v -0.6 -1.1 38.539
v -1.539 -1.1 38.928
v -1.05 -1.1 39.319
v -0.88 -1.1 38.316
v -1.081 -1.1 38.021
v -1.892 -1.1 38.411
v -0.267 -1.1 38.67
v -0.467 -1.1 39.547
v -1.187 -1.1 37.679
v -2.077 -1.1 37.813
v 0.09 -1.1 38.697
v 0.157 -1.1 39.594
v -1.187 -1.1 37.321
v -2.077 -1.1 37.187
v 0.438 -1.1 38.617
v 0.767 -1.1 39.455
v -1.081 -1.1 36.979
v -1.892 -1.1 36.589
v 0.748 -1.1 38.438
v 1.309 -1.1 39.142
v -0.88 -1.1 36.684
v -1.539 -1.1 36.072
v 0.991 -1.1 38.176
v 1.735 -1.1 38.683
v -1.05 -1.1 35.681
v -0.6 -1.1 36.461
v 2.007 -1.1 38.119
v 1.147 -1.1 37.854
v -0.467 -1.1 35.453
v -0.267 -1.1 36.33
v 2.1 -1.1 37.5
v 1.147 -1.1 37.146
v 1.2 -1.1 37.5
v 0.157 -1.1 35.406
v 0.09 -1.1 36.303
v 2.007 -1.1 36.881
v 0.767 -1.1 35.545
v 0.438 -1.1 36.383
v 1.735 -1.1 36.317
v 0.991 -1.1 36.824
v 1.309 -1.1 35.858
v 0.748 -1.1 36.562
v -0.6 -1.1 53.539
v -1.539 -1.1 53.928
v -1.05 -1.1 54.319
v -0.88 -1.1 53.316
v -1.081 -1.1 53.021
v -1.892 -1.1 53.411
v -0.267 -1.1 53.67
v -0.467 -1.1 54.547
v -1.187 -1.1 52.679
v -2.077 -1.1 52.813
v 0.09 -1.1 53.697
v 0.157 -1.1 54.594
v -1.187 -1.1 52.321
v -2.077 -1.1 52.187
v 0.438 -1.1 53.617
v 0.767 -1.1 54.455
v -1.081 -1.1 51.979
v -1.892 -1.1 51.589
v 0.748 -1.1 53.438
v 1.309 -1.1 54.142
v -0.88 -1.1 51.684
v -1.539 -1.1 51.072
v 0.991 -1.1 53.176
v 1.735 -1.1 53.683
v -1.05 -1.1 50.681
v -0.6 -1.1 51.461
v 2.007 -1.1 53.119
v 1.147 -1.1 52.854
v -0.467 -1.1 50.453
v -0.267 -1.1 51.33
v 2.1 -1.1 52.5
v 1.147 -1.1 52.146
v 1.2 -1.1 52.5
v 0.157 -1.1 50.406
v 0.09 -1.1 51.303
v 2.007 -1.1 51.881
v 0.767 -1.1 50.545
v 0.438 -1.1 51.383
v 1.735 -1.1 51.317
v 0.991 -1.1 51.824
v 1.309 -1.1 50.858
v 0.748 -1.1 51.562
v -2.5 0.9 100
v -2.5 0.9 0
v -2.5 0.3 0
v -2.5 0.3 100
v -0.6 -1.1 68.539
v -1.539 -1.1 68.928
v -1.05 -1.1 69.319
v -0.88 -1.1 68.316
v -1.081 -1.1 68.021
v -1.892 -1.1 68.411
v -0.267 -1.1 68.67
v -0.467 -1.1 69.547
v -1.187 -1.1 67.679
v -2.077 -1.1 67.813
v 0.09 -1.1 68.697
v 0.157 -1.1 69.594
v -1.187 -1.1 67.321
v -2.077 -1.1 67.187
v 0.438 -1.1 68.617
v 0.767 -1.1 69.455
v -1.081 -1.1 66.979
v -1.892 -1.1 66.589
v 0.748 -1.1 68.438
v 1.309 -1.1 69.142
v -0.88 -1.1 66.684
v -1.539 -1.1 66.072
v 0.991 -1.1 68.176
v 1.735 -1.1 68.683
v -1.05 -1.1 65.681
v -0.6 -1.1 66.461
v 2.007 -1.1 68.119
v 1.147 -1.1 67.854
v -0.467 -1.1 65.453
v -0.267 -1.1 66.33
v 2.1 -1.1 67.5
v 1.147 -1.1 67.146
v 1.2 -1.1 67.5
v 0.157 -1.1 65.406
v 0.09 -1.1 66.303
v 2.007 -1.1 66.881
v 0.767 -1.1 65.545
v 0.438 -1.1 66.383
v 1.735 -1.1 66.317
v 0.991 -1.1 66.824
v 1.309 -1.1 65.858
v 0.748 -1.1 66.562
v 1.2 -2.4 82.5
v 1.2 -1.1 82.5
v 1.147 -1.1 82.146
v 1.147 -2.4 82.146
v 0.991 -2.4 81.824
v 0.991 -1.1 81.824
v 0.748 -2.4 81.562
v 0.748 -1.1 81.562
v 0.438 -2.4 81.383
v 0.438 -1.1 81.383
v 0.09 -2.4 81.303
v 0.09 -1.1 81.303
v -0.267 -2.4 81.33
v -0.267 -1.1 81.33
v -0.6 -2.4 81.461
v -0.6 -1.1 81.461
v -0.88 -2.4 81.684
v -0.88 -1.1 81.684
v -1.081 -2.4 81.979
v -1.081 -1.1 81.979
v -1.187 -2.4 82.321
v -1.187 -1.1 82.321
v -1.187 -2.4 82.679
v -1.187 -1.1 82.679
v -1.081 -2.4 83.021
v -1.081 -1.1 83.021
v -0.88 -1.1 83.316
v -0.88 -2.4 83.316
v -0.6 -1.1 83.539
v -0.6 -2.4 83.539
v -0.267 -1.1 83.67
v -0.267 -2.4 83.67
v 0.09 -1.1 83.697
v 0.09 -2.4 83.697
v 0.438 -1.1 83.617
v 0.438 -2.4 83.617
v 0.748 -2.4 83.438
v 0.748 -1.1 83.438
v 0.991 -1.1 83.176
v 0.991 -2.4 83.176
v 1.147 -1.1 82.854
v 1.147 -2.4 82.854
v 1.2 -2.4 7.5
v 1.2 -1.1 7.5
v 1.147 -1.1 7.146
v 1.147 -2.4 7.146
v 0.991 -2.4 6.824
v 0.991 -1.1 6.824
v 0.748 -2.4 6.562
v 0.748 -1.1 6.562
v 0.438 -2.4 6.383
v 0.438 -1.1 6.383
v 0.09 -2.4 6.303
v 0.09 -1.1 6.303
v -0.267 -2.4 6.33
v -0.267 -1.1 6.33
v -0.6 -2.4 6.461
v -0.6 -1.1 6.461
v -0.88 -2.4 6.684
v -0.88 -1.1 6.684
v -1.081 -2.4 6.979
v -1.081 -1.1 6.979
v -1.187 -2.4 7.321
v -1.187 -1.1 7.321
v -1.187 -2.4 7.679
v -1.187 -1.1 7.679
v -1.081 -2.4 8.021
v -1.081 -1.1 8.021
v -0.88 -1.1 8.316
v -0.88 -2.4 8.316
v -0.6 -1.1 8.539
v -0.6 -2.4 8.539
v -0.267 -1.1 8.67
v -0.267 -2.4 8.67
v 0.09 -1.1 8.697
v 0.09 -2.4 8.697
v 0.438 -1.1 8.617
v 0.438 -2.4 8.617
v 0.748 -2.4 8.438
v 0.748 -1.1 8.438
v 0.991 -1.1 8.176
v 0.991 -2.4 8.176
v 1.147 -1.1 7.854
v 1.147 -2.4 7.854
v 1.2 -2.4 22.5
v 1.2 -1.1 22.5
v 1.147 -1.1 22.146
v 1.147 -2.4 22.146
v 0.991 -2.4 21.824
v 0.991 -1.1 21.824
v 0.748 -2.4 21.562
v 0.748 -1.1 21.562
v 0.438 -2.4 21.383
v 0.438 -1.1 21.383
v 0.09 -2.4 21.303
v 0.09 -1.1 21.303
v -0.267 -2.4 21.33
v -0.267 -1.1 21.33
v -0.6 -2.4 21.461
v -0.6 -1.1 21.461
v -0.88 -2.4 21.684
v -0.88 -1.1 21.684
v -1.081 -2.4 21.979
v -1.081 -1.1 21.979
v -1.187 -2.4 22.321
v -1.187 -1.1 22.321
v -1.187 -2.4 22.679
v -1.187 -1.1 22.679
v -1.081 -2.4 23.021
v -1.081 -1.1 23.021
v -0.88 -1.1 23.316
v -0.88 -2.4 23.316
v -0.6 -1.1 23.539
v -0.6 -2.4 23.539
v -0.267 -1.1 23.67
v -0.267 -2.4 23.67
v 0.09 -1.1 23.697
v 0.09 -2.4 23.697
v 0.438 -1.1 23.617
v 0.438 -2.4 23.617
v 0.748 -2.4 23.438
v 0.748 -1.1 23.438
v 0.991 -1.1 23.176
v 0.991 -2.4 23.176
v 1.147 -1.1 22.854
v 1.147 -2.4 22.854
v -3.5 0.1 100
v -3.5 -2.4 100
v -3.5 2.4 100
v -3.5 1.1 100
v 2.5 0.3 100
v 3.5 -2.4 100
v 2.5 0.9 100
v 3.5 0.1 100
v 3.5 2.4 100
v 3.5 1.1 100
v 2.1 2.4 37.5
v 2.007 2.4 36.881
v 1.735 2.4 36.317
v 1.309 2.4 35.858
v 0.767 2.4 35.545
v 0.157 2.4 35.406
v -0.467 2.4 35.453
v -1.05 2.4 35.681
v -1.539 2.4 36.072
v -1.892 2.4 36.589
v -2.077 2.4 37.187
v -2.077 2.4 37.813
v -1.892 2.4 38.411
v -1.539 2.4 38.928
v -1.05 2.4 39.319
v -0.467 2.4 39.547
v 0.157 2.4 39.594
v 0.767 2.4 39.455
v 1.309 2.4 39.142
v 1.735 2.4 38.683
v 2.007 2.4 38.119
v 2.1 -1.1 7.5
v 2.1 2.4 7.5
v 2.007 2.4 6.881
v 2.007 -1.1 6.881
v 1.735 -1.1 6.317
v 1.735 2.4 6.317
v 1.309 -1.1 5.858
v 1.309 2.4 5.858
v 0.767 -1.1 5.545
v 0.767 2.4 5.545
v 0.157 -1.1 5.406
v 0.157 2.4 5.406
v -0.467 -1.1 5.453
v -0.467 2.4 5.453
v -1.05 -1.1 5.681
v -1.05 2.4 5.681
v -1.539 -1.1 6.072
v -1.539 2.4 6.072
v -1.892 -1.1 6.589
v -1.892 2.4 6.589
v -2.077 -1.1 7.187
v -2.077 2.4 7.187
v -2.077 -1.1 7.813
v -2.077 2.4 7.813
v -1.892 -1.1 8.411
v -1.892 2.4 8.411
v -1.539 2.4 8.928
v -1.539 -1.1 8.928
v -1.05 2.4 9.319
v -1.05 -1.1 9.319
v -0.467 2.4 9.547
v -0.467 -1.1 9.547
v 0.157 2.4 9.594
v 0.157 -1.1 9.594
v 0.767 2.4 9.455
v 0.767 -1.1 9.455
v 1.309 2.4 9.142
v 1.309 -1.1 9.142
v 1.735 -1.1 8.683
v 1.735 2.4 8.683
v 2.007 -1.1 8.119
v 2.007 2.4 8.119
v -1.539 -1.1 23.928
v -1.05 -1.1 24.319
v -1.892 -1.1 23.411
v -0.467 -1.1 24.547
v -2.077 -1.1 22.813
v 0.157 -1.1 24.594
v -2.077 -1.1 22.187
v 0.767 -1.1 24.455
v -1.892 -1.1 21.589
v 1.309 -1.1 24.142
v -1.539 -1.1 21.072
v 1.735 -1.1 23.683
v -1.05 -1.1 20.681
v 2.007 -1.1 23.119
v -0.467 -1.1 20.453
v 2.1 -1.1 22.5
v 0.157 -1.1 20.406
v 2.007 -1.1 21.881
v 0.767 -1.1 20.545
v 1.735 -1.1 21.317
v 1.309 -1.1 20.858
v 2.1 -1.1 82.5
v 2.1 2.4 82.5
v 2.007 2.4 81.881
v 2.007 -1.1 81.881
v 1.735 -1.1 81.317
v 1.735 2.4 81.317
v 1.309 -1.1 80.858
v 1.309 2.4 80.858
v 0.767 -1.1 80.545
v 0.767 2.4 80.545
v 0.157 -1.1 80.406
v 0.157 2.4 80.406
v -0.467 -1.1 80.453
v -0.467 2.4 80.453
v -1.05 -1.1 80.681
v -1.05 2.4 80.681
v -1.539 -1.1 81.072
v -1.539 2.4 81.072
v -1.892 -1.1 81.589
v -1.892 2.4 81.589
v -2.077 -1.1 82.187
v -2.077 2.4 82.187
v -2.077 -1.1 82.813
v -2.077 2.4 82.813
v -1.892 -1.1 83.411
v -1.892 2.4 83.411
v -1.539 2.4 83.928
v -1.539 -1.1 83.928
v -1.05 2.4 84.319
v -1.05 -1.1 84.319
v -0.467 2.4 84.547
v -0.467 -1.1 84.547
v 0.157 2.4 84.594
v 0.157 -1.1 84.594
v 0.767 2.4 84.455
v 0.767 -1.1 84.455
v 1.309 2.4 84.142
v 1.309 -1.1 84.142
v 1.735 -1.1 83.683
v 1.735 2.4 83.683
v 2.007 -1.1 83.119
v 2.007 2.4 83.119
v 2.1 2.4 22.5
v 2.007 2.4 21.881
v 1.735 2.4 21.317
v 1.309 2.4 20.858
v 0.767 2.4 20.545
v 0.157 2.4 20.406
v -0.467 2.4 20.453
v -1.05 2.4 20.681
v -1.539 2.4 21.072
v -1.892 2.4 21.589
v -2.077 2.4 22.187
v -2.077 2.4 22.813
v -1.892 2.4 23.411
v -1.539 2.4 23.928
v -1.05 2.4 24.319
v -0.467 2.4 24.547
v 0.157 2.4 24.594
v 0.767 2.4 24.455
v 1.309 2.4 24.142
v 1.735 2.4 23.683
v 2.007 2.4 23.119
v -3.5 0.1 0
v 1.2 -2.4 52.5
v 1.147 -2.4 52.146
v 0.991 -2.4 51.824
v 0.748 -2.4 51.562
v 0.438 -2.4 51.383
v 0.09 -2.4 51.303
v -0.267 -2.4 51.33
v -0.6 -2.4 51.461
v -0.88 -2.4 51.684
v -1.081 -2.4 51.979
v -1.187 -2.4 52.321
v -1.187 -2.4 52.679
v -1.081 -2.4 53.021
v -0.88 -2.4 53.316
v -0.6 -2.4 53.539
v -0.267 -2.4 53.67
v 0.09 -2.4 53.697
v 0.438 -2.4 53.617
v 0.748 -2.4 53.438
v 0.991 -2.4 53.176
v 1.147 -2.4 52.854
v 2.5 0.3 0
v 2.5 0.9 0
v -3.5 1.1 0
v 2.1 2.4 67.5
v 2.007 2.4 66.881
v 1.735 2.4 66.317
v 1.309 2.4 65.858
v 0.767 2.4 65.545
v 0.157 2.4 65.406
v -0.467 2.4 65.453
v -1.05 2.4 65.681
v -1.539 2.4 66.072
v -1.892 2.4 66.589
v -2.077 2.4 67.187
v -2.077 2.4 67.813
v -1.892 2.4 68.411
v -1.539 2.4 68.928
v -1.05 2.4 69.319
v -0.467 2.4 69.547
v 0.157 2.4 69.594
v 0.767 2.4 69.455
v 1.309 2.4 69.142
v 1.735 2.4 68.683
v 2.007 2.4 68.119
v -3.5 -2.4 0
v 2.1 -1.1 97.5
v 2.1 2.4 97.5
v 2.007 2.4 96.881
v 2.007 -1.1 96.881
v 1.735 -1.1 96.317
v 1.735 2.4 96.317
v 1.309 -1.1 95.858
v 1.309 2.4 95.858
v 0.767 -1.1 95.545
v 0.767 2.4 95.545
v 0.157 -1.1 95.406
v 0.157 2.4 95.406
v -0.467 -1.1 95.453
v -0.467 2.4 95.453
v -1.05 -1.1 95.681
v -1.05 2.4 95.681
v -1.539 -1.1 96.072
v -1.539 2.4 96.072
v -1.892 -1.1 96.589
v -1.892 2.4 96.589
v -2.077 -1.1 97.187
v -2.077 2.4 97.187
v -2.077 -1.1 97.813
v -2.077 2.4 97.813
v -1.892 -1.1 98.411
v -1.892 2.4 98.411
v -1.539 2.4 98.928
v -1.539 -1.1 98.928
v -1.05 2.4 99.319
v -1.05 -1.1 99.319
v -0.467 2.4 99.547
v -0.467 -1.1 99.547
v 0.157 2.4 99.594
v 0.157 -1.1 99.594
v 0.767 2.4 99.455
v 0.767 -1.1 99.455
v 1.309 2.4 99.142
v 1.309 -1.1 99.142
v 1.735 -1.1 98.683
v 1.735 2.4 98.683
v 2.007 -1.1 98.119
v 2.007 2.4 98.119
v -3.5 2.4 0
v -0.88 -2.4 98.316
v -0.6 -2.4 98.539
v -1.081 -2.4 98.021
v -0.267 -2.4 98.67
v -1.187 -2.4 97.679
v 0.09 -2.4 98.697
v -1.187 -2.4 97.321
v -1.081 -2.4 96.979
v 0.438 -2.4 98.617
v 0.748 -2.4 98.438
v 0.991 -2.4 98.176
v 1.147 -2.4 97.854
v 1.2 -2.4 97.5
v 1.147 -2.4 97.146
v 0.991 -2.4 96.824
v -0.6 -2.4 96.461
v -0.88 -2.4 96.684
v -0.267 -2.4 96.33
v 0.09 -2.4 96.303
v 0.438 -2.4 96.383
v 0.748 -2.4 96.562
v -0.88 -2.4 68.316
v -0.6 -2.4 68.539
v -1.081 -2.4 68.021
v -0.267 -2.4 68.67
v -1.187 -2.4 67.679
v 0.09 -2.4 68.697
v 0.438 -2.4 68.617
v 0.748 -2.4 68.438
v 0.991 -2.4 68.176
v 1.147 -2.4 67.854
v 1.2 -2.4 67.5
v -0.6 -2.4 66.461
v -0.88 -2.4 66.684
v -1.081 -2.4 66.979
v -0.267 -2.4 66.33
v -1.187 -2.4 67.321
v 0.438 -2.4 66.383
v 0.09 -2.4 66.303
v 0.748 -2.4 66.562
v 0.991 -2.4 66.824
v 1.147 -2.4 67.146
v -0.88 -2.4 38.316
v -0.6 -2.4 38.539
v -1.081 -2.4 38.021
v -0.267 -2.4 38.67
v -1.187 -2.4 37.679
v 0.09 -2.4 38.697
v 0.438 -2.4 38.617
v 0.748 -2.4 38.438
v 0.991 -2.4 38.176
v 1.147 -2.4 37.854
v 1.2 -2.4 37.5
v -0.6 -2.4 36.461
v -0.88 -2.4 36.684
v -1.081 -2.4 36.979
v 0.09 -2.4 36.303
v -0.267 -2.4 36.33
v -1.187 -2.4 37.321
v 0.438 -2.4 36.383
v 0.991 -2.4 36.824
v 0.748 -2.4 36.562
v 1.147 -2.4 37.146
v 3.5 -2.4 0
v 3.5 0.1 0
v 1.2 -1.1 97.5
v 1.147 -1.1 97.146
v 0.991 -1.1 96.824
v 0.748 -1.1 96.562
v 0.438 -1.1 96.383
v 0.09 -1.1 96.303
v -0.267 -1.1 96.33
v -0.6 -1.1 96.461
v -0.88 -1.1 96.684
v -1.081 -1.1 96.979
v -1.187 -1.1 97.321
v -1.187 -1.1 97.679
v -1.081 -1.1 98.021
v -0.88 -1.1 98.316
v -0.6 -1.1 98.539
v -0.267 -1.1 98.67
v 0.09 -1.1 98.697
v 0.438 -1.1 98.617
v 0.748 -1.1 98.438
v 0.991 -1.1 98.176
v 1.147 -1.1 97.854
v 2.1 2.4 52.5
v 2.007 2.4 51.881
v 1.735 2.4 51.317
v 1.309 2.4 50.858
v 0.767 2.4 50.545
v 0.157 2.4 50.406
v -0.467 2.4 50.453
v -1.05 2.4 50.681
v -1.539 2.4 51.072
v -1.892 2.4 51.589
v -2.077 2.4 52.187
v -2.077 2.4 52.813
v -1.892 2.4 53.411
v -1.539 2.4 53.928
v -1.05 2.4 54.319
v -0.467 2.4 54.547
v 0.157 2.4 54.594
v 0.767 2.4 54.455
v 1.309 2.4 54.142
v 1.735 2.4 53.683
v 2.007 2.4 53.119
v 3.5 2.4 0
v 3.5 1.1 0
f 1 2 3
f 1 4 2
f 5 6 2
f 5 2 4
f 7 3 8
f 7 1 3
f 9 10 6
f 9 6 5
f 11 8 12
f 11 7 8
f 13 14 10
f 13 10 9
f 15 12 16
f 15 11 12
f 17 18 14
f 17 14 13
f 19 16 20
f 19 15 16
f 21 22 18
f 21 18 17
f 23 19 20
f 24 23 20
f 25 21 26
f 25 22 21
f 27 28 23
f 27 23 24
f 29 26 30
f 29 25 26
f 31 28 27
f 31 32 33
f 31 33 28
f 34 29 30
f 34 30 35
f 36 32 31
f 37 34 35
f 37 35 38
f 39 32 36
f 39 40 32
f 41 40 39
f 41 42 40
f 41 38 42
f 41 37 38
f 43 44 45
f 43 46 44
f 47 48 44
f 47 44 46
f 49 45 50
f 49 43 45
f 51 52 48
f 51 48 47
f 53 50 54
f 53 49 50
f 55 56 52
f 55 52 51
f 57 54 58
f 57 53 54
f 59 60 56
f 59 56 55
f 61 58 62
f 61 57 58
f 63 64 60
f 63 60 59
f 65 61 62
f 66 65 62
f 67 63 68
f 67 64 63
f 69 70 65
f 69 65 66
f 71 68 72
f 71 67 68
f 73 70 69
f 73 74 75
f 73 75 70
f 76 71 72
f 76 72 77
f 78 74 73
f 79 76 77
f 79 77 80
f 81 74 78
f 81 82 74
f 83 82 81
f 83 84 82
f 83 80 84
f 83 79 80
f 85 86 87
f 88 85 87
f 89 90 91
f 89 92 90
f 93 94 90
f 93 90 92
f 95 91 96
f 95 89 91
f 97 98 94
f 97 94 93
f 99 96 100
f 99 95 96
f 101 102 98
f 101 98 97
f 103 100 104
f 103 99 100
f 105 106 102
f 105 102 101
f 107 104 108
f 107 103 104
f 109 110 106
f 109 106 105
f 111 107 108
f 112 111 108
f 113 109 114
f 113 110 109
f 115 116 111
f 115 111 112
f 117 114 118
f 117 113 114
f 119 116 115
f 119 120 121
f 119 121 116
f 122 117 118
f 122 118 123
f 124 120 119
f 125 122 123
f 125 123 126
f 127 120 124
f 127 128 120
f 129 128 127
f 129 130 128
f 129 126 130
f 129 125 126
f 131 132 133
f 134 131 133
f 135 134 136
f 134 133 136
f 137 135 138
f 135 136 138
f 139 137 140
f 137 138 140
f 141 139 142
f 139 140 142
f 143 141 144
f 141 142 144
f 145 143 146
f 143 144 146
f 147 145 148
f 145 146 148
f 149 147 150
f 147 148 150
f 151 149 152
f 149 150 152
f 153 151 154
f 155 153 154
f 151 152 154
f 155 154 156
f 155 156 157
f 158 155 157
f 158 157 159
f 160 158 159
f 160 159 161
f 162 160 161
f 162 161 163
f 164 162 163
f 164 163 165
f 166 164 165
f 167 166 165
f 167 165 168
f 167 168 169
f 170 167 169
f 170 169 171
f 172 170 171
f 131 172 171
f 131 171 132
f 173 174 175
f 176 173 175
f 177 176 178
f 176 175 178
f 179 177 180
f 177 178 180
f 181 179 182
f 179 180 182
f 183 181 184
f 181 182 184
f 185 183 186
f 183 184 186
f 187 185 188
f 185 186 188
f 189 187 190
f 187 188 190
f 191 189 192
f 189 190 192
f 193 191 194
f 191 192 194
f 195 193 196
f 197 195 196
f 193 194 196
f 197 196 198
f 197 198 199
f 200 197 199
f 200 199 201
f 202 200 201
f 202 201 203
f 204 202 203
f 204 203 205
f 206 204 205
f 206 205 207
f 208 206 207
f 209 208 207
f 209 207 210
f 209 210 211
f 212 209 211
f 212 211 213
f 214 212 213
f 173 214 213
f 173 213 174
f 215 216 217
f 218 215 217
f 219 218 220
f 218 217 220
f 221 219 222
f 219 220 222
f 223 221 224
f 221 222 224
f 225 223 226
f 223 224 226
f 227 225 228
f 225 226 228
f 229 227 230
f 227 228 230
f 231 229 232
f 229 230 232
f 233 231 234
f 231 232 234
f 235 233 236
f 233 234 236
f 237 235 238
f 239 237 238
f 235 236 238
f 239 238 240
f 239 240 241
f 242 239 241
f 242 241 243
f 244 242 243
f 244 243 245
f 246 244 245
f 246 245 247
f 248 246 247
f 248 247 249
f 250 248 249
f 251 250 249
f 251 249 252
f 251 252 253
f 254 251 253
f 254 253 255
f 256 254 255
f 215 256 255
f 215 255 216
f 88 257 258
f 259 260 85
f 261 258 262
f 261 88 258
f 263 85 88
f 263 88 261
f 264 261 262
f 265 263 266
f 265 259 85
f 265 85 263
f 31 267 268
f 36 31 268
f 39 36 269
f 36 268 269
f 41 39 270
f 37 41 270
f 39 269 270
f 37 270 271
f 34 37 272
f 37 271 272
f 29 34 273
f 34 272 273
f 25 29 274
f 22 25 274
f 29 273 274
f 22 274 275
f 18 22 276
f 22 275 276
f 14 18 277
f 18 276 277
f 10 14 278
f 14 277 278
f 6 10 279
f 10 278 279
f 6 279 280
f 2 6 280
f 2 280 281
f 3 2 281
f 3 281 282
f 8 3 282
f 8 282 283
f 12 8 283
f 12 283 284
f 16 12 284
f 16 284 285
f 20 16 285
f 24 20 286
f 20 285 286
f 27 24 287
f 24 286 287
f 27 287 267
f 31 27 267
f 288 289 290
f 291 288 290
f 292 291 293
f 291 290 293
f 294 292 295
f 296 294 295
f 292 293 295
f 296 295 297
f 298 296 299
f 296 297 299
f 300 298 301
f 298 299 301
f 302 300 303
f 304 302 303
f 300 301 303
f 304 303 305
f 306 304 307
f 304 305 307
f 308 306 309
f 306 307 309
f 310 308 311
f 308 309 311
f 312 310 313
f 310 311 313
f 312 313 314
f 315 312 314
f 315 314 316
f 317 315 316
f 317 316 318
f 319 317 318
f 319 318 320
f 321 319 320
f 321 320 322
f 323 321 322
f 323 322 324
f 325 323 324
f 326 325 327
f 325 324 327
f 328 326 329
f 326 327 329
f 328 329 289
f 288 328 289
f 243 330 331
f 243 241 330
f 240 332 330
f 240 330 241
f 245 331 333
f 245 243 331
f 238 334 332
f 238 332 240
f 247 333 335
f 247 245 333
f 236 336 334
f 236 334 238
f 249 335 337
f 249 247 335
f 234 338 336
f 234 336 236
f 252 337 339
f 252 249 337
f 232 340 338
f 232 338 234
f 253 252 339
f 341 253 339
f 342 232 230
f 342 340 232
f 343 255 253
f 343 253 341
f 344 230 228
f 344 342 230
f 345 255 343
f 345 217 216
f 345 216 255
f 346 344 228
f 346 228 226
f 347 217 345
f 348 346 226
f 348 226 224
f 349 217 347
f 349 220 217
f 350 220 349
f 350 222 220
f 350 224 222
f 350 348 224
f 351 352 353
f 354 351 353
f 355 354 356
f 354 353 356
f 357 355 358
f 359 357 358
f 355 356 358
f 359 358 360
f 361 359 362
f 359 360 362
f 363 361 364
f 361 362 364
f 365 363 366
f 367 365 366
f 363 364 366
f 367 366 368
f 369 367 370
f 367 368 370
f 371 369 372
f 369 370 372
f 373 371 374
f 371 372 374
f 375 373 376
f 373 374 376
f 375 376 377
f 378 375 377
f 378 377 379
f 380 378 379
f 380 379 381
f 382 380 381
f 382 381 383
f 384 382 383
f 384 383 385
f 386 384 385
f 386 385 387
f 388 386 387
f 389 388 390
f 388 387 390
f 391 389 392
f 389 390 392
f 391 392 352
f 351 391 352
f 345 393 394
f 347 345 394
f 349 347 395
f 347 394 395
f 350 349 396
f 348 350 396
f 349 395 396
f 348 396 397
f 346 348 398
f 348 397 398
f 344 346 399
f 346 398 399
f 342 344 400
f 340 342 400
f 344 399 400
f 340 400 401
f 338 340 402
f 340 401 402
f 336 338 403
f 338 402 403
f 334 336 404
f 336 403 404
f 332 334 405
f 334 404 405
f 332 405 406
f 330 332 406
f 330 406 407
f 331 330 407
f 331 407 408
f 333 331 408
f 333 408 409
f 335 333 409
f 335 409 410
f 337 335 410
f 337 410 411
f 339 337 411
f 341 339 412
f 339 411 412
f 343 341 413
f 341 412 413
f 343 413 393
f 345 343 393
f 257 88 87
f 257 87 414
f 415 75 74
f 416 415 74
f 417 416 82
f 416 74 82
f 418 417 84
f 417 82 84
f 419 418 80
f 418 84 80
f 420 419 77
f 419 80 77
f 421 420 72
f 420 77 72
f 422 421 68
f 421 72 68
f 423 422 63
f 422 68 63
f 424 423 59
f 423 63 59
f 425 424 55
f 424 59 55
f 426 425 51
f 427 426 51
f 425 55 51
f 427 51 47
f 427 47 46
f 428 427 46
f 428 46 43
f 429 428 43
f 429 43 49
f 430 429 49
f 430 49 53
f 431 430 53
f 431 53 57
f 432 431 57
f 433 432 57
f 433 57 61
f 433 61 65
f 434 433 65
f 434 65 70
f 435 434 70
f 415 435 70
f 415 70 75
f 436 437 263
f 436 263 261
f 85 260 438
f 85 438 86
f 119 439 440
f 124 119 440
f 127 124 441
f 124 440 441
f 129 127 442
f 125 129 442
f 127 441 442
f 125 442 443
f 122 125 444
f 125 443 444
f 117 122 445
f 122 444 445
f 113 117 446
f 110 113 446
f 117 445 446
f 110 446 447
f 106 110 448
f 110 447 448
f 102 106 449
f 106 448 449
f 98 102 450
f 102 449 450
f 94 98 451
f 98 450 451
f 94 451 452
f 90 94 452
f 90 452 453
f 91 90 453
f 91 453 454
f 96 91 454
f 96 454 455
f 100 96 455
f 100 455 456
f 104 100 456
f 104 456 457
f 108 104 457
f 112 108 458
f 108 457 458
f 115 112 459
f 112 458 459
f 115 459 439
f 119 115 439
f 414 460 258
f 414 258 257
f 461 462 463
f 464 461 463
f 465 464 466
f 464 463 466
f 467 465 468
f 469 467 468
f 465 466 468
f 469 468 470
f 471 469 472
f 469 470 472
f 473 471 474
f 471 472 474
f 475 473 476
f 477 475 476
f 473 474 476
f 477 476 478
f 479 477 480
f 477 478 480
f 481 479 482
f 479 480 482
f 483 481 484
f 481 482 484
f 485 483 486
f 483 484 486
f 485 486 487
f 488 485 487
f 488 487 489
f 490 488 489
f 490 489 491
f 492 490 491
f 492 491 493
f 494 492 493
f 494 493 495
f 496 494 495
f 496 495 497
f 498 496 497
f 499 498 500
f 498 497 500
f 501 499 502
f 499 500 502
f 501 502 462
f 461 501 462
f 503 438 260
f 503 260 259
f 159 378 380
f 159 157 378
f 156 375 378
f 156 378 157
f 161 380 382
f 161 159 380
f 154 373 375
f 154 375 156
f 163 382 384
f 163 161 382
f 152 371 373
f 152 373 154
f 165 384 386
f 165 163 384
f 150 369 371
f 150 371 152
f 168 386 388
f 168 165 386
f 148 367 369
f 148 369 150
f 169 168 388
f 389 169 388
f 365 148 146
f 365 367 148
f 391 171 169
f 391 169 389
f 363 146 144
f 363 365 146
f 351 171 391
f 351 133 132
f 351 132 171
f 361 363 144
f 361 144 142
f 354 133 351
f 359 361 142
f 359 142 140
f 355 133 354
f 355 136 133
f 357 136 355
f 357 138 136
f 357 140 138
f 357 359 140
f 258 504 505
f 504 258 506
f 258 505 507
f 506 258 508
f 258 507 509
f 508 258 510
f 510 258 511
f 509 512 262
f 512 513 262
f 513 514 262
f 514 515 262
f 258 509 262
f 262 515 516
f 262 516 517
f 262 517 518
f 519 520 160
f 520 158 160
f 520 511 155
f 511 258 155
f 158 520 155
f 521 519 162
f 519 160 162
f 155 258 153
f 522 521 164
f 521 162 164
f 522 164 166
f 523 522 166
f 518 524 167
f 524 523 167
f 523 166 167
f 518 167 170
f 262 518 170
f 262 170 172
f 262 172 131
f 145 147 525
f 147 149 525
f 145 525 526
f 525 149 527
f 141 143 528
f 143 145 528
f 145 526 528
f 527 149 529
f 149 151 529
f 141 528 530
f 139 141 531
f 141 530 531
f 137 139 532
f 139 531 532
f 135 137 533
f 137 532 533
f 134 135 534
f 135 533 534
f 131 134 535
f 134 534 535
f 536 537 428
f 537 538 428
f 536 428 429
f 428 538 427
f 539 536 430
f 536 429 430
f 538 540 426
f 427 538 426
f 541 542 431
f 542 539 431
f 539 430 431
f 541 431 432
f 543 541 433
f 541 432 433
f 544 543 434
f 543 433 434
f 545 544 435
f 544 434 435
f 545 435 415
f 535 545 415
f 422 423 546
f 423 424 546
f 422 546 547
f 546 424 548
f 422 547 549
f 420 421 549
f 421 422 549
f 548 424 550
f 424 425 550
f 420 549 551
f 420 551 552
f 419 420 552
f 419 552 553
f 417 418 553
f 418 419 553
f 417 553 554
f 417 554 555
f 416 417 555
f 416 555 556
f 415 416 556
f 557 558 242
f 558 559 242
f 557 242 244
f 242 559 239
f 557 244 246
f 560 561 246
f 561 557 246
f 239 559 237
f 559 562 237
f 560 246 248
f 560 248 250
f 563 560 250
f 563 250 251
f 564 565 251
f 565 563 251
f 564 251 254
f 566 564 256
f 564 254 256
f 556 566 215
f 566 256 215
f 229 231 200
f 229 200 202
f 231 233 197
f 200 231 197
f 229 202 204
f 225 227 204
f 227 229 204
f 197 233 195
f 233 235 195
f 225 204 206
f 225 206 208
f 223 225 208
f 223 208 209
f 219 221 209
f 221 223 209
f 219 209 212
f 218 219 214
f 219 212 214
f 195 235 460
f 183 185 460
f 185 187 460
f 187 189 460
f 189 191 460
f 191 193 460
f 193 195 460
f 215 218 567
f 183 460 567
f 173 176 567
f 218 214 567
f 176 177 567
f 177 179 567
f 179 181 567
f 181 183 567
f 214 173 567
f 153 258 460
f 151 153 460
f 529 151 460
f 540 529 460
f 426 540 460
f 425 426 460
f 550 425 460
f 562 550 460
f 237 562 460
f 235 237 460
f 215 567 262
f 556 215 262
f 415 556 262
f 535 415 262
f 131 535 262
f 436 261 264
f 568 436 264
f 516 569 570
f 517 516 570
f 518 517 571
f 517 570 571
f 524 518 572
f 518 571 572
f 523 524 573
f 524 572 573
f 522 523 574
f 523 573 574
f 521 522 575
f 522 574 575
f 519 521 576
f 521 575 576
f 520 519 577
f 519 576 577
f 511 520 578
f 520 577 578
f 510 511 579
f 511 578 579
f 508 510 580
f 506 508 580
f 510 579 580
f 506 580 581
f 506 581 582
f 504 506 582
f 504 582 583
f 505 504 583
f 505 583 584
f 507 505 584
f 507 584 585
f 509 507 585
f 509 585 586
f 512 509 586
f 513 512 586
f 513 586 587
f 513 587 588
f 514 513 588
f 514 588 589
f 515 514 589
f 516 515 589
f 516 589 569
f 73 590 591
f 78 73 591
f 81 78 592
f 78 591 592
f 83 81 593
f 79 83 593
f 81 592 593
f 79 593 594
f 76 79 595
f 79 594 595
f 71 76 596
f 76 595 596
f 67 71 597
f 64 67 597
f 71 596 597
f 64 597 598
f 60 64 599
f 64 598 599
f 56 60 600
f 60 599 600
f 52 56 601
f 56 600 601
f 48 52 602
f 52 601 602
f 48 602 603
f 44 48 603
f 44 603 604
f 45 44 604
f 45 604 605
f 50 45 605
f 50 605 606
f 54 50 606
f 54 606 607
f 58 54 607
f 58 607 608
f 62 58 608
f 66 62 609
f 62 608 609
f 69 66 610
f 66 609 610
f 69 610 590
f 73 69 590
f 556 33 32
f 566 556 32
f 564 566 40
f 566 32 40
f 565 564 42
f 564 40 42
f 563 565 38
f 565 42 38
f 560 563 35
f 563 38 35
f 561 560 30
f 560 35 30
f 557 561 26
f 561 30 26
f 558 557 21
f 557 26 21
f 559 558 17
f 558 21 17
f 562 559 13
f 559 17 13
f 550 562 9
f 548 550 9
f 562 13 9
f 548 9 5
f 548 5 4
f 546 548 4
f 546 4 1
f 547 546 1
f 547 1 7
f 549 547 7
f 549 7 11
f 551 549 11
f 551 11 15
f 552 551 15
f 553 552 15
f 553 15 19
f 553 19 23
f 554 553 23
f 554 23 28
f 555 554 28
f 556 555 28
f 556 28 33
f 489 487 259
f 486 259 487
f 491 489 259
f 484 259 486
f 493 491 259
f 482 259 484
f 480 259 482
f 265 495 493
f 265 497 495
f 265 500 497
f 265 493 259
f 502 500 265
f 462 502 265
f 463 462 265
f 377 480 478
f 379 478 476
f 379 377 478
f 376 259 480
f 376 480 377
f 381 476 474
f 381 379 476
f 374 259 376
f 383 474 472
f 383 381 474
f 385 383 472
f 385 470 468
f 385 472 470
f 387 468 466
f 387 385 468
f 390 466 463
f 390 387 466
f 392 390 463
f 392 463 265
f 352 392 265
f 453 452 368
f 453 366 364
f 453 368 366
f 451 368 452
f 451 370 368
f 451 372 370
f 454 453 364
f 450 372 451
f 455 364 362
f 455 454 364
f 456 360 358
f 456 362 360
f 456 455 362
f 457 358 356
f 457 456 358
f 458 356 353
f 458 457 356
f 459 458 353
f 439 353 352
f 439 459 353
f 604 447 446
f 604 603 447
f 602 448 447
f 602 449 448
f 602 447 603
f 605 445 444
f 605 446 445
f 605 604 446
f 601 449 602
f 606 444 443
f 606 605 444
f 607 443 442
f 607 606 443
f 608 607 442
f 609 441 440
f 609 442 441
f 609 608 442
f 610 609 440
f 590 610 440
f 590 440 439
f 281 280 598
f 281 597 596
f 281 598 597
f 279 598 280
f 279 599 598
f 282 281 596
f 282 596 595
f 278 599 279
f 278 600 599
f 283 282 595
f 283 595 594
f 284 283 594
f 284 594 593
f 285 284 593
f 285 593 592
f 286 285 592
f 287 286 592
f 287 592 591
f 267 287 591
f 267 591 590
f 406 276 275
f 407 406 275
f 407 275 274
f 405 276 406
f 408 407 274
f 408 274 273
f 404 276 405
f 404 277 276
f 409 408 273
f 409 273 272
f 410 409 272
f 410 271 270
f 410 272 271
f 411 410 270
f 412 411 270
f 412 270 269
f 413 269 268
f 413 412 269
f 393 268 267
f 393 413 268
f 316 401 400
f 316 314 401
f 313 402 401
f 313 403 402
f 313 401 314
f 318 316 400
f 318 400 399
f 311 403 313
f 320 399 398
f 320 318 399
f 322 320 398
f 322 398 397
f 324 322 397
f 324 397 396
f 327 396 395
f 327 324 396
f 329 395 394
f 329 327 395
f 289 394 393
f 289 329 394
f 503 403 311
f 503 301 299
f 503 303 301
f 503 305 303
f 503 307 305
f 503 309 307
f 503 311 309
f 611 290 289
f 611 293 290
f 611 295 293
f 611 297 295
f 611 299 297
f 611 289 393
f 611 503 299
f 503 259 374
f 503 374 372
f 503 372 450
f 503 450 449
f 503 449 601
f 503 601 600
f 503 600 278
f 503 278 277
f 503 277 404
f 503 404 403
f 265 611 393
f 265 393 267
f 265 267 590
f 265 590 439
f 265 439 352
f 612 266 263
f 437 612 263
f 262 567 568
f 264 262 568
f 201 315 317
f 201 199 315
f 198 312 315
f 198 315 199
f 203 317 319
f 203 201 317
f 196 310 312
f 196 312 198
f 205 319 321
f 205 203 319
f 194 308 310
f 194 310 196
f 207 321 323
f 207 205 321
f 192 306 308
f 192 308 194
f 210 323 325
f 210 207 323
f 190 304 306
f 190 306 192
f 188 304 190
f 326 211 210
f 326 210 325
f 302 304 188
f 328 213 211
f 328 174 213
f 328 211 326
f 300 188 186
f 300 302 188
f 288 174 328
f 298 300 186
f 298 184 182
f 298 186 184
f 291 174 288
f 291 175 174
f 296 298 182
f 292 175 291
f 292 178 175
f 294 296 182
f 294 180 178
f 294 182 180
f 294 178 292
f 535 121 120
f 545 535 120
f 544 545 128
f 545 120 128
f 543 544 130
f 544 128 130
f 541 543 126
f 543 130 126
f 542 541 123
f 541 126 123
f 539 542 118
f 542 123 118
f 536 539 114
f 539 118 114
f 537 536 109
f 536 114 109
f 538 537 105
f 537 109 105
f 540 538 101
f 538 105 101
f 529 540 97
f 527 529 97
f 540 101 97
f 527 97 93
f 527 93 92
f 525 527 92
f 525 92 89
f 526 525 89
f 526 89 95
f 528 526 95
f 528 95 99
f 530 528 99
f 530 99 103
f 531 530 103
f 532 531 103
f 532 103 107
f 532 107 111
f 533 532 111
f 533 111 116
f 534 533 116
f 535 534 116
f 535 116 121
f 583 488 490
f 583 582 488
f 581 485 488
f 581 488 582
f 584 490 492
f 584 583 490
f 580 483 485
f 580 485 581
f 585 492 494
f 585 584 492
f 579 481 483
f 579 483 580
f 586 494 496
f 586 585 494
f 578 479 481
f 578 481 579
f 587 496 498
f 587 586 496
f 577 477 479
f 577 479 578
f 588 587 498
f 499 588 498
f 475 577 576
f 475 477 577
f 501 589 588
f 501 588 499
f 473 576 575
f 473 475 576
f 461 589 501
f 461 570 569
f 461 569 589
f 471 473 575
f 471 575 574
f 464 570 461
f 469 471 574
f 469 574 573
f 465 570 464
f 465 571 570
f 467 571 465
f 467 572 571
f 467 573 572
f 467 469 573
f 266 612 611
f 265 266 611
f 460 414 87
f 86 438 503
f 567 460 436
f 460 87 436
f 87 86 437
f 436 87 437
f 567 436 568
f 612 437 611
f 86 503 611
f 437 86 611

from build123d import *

# Parameters (mm, degrees)
SKETCH_1_W          = 7
SKETCH_1_H          = 4.8
EXTRUDE_1_DEPTH     = 100
SKETCH_2_R          = 1.2
CUT_EXTRUDE_1_DEPTH = 5.8
SKETCH_3_R          = 2.1
CUT_EXTRUDE_2_DEPTH = 3.5
CUT_EXTRUDE_3_DEPTH = 101


with BuildPart() as part:
    # 草图1 → 凸台-拉伸1 (new body)
    with BuildSketch(Plane.XY):
        Rectangle(SKETCH_1_W, SKETCH_1_H)
    extrude(amount=EXTRUDE_1_DEPTH)

    # 草图2 → 切除-拉伸1 (cut, through all)
    with BuildSketch(Plane(origin=(0, 2.4, 0), x_dir=(1, 0, 0), z_dir=(0, 1, 0))):
        with Locations((0, -7.5)):
            Circle(SKETCH_2_R)
        with Locations((0, -22.5)):
            Circle(SKETCH_2_R)
        with Locations((0, -37.5)):
            Circle(SKETCH_2_R)
        with Locations((0, -52.5)):
            Circle(SKETCH_2_R)
        with Locations((0, -67.5)):
            Circle(SKETCH_2_R)
        with Locations((0, -82.5)):
            Circle(SKETCH_2_R)
        with Locations((0, -97.5)):
            Circle(SKETCH_2_R)
        with Locations((0, -112.5)):
            Circle(SKETCH_2_R)
        with Locations((0, -127.5)):
            Circle(SKETCH_2_R)
        with Locations((0, -142.5)):
            Circle(SKETCH_2_R)
        with Locations((0, -157.5)):
            Circle(SKETCH_2_R)
        with Locations((0, -172.5)):
            Circle(SKETCH_2_R)
        with Locations((0, -187.5)):
            Circle(SKETCH_2_R)
        with Locations((0, -202.5)):
            Circle(SKETCH_2_R)
        with Locations((0, -217.5)):
            Circle(SKETCH_2_R)
        with Locations((0, -232.5)):
            Circle(SKETCH_2_R)
        with Locations((0, -247.5)):
            Circle(SKETCH_2_R)
        with Locations((0, -262.5)):
            Circle(SKETCH_2_R)
        with Locations((0, -277.5)):
            Circle(SKETCH_2_R)
        with Locations((0, -292.5)):
            Circle(SKETCH_2_R)
    extrude(amount=-CUT_EXTRUDE_1_DEPTH, mode=Mode.SUBTRACT)

    # 草图3 → 切除-拉伸2 (cut)
    with BuildSketch(Plane(origin=(0, 2.4, 0), x_dir=(1, 0, 0), z_dir=(0, 1, 0))):
        with Locations((0, -7.5)):
            Circle(SKETCH_3_R)
        with Locations((0, -22.5)):
            Circle(SKETCH_3_R)
        with Locations((0, -37.5)):
            Circle(SKETCH_3_R)
        with Locations((0, -52.5)):
            Circle(SKETCH_3_R)
        with Locations((0, -67.5)):
            Circle(SKETCH_3_R)
        with Locations((0, -82.5)):
            Circle(SKETCH_3_R)
        with Locations((0, -97.5)):
            Circle(SKETCH_3_R)
        with Locations((0, -112.5)):
            Circle(SKETCH_3_R)
        with Locations((0, -127.5)):
            Circle(SKETCH_3_R)
        with Locations((0, -142.5)):
            Circle(SKETCH_3_R)
        with Locations((0, -157.5)):
            Circle(SKETCH_3_R)
        with Locations((0, -172.5)):
            Circle(SKETCH_3_R)
        with Locations((0, -187.5)):
            Circle(SKETCH_3_R)
        with Locations((0, -202.5)):
            Circle(SKETCH_3_R)
        with Locations((0, -217.5)):
            Circle(SKETCH_3_R)
        with Locations((0, -232.5)):
            Circle(SKETCH_3_R)
        with Locations((0, -247.5)):
            Circle(SKETCH_3_R)
        with Locations((0, -262.5)):
            Circle(SKETCH_3_R)
        with Locations((0, -277.5)):
            Circle(SKETCH_3_R)
        with Locations((0, -292.5)):
            Circle(SKETCH_3_R)
    extrude(amount=-CUT_EXTRUDE_2_DEPTH, mode=Mode.SUBTRACT)

    # 草图4 → 切除-拉伸3 (cut, through all)
    with BuildSketch(Plane(origin=(0, 0, 0), x_dir=(-1, 0, 0), z_dir=(0, 0, -1))):
        Polygon((3.5, 1.1), (2.5, 0.9), (2.5, 0.3), (3.5, 0.1), align=None)
        Polygon((-3.5, 1.1), (-2.5, 0.9), (-2.5, 0.3), (-3.5, 0.1), align=None)
    extrude(amount=-CUT_EXTRUDE_3_DEPTH, mode=Mode.SUBTRACT)


solid = part.part
